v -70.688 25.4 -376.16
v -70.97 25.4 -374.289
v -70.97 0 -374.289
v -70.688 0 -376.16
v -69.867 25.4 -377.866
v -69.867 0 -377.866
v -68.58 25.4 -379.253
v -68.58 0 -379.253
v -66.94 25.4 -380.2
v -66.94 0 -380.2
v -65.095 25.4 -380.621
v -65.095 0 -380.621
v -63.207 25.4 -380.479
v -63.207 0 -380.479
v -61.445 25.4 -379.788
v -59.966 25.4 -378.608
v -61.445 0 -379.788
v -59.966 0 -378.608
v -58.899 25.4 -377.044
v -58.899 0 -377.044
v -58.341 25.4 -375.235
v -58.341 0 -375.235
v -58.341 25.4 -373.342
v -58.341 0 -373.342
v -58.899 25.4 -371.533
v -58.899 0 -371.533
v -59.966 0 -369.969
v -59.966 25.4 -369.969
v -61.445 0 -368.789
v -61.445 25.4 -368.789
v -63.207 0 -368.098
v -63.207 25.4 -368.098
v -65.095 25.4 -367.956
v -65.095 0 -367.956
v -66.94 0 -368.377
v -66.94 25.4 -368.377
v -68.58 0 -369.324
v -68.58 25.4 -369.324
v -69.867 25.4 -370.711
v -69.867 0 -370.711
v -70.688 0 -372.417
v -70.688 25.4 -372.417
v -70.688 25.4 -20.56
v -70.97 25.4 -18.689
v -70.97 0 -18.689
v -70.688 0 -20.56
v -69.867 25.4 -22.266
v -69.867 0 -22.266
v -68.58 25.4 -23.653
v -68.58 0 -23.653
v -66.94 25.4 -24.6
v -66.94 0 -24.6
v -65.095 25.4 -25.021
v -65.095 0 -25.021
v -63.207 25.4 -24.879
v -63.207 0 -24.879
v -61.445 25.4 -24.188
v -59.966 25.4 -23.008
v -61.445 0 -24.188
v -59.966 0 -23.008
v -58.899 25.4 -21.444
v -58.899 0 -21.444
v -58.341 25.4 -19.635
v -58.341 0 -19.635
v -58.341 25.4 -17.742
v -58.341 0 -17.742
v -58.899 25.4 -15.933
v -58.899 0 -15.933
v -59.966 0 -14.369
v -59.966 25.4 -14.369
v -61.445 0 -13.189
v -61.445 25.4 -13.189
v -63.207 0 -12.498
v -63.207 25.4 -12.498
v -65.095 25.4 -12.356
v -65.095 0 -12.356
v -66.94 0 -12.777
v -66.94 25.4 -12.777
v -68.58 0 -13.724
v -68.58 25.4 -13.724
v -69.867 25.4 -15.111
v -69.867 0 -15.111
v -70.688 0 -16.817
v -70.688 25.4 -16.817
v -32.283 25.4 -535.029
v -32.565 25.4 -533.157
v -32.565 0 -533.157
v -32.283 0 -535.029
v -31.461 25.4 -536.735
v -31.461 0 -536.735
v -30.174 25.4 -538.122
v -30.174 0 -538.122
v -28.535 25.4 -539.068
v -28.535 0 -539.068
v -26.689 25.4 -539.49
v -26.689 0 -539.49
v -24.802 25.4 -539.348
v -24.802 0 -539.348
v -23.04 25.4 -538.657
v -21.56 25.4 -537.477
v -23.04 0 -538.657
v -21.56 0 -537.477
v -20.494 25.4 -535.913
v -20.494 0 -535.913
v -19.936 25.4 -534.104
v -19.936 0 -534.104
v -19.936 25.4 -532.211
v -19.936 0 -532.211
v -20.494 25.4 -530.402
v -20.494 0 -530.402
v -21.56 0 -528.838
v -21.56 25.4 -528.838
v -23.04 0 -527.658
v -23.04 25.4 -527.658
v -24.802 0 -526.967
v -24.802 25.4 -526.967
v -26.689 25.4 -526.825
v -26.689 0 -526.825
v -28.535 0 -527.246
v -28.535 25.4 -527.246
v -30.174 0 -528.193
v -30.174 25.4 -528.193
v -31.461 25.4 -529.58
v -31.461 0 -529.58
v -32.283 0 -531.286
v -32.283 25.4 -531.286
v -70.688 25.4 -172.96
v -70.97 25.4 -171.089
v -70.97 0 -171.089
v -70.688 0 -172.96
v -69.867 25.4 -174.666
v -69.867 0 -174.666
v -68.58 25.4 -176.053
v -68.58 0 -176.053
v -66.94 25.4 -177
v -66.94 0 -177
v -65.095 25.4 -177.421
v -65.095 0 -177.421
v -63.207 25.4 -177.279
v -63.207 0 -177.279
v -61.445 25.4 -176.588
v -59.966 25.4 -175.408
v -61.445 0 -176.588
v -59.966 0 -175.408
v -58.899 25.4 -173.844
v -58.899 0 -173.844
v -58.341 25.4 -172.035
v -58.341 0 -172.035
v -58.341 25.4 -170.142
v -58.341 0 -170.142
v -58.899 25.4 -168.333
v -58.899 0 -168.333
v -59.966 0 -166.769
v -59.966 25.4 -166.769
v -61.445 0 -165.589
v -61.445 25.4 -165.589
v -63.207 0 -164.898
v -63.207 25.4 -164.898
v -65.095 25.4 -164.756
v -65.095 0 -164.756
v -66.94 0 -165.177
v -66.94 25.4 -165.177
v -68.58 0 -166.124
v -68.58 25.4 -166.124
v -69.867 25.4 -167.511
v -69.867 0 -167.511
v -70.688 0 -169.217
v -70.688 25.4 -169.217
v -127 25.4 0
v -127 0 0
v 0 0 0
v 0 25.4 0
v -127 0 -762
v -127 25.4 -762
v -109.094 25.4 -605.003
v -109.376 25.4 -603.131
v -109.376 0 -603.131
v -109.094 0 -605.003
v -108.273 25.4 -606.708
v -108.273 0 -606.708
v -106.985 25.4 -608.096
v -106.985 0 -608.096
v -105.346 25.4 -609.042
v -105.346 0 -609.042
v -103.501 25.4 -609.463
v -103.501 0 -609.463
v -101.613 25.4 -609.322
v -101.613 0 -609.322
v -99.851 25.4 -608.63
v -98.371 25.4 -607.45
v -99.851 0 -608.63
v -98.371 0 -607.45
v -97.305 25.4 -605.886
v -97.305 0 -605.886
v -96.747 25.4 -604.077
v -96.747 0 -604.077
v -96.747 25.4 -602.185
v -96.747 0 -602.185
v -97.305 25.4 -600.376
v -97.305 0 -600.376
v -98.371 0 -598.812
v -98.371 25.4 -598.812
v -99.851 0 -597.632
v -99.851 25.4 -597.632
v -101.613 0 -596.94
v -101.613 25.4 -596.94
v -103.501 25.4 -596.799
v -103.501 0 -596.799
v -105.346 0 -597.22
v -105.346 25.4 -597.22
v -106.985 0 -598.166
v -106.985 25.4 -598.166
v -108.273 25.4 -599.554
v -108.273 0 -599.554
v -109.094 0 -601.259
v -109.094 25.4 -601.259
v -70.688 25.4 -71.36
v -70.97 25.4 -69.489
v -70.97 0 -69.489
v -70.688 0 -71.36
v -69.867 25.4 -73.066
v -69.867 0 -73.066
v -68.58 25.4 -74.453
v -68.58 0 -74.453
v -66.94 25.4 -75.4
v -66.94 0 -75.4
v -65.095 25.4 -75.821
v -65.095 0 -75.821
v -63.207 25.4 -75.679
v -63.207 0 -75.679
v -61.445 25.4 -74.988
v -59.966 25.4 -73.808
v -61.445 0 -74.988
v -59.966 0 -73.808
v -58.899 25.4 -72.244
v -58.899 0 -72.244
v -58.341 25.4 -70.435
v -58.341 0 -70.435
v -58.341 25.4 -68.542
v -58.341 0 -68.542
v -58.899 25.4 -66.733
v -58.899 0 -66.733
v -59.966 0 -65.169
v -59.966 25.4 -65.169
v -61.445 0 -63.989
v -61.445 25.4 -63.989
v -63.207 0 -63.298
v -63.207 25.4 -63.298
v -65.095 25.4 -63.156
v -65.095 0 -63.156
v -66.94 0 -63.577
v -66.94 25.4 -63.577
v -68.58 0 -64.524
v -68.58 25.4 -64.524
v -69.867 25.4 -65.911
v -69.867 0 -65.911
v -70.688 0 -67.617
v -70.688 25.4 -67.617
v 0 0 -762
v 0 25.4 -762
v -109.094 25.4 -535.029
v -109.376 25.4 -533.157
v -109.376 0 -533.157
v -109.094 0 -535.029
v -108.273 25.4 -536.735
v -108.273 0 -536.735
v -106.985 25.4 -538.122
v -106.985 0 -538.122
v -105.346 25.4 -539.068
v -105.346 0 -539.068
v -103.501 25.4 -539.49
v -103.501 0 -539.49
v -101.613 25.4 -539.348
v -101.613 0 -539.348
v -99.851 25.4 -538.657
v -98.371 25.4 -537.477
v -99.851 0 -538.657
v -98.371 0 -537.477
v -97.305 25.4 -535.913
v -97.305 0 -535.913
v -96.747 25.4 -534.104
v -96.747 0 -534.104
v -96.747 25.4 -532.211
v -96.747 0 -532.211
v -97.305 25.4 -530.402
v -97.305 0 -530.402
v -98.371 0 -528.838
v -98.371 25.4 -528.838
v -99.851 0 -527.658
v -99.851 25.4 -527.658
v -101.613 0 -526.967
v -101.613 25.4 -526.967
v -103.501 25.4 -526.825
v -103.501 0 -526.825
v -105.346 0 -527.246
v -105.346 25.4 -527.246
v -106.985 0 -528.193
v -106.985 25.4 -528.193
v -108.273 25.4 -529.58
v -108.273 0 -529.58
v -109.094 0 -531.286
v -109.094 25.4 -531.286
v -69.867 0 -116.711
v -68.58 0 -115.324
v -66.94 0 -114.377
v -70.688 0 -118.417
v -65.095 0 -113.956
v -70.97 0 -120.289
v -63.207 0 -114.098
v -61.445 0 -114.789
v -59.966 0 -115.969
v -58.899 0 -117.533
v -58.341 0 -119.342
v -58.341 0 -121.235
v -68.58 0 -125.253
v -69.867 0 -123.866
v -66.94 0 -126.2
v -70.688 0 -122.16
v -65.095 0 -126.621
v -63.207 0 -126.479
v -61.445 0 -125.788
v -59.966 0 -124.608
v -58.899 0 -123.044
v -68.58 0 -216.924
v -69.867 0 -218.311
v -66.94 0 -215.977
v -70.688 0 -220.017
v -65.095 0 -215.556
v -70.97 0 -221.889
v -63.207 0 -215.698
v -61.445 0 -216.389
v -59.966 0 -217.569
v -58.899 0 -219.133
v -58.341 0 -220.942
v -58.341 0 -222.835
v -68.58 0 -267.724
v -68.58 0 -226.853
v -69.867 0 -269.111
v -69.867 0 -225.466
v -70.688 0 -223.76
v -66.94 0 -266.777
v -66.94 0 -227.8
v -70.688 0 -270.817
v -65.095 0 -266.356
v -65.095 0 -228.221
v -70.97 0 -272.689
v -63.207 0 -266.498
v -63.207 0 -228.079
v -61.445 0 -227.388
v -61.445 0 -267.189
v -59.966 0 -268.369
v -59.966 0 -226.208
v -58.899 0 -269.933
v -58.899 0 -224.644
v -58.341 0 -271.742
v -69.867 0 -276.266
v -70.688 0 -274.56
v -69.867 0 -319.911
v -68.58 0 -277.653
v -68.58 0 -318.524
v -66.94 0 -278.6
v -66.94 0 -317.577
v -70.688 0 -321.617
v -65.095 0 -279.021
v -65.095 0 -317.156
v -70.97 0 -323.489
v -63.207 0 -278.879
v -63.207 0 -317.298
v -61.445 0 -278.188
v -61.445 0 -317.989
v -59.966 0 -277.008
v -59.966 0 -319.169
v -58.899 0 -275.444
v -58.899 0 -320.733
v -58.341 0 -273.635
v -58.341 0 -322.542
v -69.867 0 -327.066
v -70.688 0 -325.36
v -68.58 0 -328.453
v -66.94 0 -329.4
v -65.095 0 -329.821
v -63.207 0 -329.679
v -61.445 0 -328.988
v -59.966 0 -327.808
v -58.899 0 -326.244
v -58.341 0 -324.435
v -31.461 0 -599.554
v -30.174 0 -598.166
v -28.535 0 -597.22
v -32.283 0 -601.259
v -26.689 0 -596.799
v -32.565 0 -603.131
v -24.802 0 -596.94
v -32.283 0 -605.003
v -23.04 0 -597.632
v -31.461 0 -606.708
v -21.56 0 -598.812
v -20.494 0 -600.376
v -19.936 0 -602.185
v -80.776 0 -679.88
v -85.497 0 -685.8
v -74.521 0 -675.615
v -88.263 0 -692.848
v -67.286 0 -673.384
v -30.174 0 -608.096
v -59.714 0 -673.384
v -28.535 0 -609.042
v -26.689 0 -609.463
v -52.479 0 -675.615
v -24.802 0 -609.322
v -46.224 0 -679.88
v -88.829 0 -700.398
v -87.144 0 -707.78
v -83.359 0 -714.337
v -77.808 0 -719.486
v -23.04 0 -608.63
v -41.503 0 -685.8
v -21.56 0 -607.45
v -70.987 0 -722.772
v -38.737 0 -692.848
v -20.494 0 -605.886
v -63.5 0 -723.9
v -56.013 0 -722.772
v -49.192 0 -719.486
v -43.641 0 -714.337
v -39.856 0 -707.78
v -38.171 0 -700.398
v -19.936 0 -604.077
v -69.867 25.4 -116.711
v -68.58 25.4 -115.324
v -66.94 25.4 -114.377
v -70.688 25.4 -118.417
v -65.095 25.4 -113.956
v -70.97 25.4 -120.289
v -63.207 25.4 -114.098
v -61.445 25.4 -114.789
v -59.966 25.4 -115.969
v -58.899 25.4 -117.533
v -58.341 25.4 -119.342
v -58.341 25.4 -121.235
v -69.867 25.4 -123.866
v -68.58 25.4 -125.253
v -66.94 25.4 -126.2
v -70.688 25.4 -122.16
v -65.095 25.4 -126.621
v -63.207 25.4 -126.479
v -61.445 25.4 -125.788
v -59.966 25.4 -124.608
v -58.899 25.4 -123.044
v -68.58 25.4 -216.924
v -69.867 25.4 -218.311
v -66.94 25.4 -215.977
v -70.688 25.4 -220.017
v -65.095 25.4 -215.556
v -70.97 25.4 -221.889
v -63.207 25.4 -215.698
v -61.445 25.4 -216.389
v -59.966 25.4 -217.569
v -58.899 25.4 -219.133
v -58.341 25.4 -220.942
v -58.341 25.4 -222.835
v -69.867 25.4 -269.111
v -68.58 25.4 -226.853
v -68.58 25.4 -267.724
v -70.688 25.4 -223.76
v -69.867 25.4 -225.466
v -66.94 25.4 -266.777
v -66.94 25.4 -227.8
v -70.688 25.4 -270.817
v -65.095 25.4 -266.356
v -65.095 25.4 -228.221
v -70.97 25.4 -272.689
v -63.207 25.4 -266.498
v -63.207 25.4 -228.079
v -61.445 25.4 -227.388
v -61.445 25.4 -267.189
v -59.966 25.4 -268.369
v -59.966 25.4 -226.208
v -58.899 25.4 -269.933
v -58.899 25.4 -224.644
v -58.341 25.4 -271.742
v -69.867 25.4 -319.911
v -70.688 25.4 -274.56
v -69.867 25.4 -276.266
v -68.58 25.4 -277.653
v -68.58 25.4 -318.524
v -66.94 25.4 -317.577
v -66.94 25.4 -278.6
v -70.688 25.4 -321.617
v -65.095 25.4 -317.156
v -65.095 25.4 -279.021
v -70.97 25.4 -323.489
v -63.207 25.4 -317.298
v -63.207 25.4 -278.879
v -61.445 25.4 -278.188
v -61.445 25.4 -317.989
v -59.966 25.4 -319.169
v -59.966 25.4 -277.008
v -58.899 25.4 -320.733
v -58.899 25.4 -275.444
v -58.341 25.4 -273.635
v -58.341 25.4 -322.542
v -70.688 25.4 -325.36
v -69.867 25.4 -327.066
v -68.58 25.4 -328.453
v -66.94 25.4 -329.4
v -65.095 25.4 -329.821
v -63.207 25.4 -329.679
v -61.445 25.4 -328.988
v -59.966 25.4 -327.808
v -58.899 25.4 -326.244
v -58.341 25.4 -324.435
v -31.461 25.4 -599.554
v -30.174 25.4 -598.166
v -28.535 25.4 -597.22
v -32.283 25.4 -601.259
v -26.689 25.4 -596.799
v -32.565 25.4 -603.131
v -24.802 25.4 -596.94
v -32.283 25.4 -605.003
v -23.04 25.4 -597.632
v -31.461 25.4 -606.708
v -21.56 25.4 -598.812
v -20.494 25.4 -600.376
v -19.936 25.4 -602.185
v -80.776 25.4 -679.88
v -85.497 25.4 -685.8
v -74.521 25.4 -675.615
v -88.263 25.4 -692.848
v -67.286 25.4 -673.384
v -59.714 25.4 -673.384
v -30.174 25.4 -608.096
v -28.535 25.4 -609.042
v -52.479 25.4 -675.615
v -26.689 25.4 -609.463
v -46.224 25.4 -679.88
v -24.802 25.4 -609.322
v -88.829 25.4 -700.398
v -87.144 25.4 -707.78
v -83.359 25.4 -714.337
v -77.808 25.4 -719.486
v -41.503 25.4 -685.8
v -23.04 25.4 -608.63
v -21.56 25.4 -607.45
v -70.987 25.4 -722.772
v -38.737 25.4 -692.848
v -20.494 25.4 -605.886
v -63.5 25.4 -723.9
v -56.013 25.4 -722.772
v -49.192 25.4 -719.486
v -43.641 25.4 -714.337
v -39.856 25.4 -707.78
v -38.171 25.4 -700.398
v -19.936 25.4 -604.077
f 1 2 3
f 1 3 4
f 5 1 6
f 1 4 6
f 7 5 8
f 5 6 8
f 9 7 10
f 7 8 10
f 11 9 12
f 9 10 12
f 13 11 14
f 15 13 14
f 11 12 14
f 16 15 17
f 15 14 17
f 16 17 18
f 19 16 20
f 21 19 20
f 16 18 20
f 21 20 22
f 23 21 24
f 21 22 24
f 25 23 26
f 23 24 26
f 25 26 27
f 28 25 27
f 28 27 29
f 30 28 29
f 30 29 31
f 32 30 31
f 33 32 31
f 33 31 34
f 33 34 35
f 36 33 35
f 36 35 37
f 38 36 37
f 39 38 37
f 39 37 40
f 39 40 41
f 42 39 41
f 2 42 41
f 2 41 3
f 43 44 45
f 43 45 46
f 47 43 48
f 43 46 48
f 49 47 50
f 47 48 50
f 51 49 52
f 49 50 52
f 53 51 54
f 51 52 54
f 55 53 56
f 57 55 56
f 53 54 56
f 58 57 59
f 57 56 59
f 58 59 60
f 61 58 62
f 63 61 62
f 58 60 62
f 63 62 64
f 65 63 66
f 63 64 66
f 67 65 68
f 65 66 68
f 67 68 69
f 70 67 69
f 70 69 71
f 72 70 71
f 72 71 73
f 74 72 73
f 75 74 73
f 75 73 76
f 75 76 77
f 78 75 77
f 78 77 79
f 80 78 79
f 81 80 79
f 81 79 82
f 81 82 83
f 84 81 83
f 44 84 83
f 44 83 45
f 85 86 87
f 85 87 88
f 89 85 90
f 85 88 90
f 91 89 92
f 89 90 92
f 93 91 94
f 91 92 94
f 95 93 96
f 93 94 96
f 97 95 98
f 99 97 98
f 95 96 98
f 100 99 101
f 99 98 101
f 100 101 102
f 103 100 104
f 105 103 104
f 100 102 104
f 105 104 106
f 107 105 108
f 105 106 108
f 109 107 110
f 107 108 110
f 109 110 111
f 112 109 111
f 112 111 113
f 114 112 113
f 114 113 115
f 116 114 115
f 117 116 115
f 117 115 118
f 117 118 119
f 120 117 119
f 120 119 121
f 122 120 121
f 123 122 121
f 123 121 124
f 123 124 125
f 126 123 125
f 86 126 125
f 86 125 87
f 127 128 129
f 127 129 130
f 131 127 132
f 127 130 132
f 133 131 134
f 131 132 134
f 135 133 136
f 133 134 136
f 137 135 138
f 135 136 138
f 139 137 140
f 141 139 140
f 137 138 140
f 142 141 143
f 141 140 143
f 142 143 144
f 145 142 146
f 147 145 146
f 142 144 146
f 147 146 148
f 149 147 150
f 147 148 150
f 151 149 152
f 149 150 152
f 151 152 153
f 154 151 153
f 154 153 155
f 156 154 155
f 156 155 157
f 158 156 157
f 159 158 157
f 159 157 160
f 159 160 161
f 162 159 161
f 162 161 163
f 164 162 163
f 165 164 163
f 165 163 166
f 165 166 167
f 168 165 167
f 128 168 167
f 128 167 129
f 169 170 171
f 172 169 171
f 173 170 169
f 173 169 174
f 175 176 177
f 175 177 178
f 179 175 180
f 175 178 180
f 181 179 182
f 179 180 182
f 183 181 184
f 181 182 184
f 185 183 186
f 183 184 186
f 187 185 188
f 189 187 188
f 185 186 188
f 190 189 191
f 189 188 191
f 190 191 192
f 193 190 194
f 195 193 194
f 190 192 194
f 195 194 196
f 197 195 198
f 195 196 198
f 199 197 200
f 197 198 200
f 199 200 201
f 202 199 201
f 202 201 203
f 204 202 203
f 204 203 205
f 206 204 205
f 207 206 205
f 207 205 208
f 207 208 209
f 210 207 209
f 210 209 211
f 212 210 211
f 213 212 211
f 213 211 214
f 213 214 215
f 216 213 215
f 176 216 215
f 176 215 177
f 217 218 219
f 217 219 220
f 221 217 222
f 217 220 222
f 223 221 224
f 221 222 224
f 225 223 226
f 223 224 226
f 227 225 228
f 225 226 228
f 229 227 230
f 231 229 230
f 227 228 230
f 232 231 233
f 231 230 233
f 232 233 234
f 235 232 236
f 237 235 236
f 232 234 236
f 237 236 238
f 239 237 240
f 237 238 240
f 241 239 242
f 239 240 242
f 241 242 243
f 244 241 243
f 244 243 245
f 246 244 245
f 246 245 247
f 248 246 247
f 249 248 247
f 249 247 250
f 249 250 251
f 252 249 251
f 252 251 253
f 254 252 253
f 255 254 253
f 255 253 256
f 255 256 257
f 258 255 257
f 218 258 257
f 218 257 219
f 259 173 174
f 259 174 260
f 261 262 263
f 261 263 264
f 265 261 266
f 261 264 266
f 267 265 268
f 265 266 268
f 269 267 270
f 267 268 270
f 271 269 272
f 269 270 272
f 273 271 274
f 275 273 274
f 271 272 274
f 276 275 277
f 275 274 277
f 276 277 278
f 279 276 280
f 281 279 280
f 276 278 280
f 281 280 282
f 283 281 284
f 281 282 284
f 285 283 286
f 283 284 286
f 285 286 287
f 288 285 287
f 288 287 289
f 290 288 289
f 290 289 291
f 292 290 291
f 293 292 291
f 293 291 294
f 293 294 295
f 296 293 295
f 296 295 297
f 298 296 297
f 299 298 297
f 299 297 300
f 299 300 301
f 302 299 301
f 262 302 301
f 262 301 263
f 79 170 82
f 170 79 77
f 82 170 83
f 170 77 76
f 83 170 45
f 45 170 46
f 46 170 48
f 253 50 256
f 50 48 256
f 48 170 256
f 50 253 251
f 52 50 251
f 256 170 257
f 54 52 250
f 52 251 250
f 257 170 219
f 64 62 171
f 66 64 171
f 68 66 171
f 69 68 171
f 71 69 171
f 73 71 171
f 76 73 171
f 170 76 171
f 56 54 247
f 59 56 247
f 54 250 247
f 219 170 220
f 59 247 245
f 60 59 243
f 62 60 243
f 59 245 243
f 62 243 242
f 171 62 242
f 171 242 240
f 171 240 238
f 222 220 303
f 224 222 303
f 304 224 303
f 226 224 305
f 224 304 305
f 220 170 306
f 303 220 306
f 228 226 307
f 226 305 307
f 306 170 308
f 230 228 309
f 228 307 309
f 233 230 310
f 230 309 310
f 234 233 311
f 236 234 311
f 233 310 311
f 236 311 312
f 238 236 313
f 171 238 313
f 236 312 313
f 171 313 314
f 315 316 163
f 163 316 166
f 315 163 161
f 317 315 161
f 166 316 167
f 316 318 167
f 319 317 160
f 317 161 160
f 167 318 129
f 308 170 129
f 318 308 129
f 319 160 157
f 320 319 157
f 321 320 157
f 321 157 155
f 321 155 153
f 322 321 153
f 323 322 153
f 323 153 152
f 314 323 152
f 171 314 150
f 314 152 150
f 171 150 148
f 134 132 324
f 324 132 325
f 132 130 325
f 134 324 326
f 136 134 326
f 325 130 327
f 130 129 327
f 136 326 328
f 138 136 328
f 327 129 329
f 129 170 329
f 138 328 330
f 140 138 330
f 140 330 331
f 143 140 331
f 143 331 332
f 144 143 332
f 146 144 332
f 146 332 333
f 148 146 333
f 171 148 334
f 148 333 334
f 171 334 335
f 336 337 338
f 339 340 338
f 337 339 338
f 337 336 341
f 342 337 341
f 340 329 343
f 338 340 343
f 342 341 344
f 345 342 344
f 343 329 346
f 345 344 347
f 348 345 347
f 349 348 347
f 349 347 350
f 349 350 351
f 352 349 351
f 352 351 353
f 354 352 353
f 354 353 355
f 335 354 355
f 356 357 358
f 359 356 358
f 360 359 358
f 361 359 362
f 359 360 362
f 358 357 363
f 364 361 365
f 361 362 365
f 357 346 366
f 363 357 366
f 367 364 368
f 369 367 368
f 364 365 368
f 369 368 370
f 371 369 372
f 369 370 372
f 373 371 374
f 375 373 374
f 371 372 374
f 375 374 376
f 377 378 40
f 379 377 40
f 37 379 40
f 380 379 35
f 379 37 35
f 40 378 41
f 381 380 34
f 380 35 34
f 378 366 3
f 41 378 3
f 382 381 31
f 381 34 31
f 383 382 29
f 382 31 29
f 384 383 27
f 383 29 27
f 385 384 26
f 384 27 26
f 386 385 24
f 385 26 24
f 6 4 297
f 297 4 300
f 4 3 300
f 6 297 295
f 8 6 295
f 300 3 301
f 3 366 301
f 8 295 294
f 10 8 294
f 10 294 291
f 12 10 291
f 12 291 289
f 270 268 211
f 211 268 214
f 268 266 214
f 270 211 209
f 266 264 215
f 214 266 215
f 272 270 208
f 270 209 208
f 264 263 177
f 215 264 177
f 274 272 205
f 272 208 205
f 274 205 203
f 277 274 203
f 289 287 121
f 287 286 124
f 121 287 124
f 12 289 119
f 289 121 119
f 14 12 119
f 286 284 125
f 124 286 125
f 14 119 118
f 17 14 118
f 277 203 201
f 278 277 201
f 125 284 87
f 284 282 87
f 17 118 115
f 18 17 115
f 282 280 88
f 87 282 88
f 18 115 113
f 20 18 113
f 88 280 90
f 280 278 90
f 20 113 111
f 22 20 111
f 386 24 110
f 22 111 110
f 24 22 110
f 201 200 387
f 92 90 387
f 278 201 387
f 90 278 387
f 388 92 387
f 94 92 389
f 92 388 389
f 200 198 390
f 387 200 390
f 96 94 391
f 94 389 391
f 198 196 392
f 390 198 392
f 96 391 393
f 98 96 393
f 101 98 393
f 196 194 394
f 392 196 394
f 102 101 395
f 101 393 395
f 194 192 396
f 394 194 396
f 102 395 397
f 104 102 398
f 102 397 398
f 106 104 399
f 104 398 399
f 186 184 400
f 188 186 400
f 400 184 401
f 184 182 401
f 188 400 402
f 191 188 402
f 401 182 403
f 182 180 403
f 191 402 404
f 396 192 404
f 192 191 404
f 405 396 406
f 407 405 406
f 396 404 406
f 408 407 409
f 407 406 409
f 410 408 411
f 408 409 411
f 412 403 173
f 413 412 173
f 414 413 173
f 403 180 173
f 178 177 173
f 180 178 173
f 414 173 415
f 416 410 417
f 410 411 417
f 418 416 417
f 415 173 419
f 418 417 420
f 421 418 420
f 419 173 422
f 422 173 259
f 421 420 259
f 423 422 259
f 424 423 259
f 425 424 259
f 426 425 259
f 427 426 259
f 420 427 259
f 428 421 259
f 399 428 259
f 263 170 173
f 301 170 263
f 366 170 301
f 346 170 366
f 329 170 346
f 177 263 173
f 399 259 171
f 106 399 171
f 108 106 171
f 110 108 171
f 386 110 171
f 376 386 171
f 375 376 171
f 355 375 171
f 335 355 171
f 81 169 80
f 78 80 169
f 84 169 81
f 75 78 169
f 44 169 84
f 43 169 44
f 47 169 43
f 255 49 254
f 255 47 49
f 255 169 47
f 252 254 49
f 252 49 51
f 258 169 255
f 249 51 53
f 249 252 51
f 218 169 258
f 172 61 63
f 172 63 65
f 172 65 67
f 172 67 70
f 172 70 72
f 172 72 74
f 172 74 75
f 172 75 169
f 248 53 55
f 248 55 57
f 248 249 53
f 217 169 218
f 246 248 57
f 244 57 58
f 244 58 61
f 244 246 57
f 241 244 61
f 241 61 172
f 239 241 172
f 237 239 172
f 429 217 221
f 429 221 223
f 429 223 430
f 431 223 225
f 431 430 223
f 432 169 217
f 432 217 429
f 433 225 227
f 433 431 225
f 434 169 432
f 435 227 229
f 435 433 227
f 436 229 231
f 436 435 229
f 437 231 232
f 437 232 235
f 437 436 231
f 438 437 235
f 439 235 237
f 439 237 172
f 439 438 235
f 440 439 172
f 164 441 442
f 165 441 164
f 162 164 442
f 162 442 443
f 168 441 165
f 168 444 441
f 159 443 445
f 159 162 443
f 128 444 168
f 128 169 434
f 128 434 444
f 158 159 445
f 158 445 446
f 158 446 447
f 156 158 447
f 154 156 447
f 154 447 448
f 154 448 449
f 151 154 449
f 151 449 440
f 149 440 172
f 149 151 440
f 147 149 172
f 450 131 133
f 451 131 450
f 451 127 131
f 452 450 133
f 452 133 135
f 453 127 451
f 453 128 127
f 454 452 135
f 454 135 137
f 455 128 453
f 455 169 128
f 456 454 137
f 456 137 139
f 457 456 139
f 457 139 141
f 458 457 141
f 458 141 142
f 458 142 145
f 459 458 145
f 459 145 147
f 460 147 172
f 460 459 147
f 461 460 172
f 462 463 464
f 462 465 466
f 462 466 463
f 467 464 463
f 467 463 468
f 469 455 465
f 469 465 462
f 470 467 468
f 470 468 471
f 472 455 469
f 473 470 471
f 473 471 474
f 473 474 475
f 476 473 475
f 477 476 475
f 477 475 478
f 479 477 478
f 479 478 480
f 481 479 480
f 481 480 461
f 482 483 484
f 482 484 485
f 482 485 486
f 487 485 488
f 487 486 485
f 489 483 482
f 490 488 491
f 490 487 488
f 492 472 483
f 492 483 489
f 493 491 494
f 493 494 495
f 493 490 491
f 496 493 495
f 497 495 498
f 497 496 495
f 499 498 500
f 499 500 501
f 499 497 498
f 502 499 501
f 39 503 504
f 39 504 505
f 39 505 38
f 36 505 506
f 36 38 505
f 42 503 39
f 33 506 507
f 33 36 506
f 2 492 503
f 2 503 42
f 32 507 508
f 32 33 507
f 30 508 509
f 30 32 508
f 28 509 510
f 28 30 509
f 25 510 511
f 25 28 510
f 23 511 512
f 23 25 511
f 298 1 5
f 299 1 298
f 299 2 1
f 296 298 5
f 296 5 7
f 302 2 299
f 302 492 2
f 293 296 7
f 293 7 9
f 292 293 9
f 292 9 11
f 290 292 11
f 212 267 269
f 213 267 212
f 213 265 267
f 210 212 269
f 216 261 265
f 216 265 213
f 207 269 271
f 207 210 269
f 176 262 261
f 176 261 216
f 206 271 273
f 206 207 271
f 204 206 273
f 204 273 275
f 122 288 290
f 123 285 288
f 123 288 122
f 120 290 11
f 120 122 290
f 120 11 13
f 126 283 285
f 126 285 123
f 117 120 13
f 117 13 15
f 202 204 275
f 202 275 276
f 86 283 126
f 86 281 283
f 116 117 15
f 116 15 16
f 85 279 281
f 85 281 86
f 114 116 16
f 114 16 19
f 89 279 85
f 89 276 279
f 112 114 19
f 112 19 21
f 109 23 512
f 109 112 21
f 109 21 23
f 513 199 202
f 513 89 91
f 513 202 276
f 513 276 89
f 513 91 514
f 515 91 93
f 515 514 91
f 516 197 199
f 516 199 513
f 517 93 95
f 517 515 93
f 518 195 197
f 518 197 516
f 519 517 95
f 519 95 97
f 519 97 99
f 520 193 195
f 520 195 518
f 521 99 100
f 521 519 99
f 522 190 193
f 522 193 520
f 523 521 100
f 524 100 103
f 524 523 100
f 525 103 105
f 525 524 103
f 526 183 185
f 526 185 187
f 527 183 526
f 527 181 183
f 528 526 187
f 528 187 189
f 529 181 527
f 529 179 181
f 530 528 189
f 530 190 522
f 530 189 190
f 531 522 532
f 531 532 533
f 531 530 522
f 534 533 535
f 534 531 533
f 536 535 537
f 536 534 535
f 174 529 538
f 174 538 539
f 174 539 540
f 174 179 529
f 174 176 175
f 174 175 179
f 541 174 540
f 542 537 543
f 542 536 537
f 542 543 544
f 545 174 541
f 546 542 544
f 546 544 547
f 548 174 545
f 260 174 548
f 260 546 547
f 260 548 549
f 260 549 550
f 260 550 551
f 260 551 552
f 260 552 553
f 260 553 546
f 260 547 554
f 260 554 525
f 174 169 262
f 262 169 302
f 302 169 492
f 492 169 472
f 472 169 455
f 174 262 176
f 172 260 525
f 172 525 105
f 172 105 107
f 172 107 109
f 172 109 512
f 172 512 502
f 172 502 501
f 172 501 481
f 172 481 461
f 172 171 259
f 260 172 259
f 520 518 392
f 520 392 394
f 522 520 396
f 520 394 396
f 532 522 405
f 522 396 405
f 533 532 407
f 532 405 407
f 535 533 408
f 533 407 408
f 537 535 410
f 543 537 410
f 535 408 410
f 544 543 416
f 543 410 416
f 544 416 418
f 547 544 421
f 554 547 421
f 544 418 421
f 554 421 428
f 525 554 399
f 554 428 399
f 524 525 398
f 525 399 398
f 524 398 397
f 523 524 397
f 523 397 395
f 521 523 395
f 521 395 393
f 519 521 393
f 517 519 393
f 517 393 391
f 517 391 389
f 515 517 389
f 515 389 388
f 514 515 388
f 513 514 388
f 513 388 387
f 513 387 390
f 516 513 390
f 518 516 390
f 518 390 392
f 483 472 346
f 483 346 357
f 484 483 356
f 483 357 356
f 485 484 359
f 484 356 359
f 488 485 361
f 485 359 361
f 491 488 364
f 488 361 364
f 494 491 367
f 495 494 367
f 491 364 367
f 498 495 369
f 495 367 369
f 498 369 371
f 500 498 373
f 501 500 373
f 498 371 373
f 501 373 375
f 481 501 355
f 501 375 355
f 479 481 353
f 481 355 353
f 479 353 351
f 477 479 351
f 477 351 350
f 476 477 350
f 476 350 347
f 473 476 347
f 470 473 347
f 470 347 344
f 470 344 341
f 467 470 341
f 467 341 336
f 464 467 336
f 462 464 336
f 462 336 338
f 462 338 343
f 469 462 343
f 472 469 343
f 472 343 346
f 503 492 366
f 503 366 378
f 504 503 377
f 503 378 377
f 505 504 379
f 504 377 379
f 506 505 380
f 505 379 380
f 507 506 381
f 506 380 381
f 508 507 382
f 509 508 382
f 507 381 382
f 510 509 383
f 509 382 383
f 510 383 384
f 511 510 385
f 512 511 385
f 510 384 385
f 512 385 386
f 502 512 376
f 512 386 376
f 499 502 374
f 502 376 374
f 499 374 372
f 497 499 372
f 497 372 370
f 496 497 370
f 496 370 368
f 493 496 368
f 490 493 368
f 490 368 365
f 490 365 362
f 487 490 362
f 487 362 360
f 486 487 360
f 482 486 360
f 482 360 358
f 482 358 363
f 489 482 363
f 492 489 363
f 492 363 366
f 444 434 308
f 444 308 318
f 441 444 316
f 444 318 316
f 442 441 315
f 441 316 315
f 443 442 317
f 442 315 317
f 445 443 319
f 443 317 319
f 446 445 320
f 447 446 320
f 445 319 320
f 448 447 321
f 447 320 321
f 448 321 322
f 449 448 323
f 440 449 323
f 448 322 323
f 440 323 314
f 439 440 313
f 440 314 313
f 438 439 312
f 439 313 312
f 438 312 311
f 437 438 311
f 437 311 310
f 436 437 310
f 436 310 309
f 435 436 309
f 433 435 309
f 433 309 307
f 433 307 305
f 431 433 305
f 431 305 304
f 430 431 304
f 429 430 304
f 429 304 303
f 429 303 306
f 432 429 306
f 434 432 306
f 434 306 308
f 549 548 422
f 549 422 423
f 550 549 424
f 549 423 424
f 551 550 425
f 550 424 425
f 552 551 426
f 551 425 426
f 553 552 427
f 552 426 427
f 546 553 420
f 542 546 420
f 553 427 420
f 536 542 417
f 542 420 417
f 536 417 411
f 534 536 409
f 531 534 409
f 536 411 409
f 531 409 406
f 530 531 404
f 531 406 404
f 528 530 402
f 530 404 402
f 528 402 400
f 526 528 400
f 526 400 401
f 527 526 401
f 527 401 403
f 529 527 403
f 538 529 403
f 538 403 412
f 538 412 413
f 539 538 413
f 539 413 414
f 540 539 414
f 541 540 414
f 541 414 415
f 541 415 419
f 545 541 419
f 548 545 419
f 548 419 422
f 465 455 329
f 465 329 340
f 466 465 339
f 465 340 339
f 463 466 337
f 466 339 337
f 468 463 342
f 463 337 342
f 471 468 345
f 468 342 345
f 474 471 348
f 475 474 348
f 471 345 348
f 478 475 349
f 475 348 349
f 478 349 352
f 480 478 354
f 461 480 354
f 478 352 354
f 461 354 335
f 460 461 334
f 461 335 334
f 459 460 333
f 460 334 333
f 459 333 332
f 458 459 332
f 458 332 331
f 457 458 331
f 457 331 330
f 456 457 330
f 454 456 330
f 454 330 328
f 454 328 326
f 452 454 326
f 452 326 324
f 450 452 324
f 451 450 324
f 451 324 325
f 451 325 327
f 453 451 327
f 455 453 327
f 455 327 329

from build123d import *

# Parameters (mm, degrees)
SKETCH1_W                  = 127
SKETCH1_H                  = 762
BOSS_EXTRUDE1_DEPTH        = 25.4
F_1_2_0_5_DIAMETER_HOLE1_D = 50.8
F_1_2_0_5_DIAMETER_HOLE2_D = 12.7


with BuildPart() as part:
    # Sketch1 → Boss-Extrude1 (new body)
    with BuildSketch(Plane(origin=(0, 0, 0), x_dir=(1, 0, 0), z_dir=(0, 1, 0))):
        with Locations((-63.5, 381)):
            Rectangle(SKETCH1_W, SKETCH1_H)
    extrude(amount=BOSS_EXTRUDE1_DEPTH)

    # 1/2 (0.5) Diameter Hole1 (through all)
    with Locations(Plane(origin=(-63.5, 25.4, -698.5), x_dir=(0, 0, 1), z_dir=(0, 1, 0))):
        with Locations((0, 0)):
            Hole(F_1_2_0_5_DIAMETER_HOLE1_D / 2)

    # 1/2 (0.5) Diameter Hole2 (through all)
    with Locations(Plane(origin=(0, 25.4, 0), x_dir=(1, 0, 0), z_dir=(0, 1, 0))):
        with Locations((-103.026104377, 603.131071739), (-64.620447093, 374.288503187), (-26.214789808, 603.131071739), (-26.214789808, 533.157431448), (-103.026104377, 533.157431448), (-64.620447093, 323.488503187), (-64.620447093, 272.688503187), (-64.620447093, 221.888503187), (-64.620447093, 171.088503187), (-64.620447093, 120.288503187), (-64.620447093, 69.488503187), (-64.620447093, 18.688503187), (-64.620447093, -32.111496813)):
            Hole(F_1_2_0_5_DIAMETER_HOLE2_D / 2)


solid = part.part
